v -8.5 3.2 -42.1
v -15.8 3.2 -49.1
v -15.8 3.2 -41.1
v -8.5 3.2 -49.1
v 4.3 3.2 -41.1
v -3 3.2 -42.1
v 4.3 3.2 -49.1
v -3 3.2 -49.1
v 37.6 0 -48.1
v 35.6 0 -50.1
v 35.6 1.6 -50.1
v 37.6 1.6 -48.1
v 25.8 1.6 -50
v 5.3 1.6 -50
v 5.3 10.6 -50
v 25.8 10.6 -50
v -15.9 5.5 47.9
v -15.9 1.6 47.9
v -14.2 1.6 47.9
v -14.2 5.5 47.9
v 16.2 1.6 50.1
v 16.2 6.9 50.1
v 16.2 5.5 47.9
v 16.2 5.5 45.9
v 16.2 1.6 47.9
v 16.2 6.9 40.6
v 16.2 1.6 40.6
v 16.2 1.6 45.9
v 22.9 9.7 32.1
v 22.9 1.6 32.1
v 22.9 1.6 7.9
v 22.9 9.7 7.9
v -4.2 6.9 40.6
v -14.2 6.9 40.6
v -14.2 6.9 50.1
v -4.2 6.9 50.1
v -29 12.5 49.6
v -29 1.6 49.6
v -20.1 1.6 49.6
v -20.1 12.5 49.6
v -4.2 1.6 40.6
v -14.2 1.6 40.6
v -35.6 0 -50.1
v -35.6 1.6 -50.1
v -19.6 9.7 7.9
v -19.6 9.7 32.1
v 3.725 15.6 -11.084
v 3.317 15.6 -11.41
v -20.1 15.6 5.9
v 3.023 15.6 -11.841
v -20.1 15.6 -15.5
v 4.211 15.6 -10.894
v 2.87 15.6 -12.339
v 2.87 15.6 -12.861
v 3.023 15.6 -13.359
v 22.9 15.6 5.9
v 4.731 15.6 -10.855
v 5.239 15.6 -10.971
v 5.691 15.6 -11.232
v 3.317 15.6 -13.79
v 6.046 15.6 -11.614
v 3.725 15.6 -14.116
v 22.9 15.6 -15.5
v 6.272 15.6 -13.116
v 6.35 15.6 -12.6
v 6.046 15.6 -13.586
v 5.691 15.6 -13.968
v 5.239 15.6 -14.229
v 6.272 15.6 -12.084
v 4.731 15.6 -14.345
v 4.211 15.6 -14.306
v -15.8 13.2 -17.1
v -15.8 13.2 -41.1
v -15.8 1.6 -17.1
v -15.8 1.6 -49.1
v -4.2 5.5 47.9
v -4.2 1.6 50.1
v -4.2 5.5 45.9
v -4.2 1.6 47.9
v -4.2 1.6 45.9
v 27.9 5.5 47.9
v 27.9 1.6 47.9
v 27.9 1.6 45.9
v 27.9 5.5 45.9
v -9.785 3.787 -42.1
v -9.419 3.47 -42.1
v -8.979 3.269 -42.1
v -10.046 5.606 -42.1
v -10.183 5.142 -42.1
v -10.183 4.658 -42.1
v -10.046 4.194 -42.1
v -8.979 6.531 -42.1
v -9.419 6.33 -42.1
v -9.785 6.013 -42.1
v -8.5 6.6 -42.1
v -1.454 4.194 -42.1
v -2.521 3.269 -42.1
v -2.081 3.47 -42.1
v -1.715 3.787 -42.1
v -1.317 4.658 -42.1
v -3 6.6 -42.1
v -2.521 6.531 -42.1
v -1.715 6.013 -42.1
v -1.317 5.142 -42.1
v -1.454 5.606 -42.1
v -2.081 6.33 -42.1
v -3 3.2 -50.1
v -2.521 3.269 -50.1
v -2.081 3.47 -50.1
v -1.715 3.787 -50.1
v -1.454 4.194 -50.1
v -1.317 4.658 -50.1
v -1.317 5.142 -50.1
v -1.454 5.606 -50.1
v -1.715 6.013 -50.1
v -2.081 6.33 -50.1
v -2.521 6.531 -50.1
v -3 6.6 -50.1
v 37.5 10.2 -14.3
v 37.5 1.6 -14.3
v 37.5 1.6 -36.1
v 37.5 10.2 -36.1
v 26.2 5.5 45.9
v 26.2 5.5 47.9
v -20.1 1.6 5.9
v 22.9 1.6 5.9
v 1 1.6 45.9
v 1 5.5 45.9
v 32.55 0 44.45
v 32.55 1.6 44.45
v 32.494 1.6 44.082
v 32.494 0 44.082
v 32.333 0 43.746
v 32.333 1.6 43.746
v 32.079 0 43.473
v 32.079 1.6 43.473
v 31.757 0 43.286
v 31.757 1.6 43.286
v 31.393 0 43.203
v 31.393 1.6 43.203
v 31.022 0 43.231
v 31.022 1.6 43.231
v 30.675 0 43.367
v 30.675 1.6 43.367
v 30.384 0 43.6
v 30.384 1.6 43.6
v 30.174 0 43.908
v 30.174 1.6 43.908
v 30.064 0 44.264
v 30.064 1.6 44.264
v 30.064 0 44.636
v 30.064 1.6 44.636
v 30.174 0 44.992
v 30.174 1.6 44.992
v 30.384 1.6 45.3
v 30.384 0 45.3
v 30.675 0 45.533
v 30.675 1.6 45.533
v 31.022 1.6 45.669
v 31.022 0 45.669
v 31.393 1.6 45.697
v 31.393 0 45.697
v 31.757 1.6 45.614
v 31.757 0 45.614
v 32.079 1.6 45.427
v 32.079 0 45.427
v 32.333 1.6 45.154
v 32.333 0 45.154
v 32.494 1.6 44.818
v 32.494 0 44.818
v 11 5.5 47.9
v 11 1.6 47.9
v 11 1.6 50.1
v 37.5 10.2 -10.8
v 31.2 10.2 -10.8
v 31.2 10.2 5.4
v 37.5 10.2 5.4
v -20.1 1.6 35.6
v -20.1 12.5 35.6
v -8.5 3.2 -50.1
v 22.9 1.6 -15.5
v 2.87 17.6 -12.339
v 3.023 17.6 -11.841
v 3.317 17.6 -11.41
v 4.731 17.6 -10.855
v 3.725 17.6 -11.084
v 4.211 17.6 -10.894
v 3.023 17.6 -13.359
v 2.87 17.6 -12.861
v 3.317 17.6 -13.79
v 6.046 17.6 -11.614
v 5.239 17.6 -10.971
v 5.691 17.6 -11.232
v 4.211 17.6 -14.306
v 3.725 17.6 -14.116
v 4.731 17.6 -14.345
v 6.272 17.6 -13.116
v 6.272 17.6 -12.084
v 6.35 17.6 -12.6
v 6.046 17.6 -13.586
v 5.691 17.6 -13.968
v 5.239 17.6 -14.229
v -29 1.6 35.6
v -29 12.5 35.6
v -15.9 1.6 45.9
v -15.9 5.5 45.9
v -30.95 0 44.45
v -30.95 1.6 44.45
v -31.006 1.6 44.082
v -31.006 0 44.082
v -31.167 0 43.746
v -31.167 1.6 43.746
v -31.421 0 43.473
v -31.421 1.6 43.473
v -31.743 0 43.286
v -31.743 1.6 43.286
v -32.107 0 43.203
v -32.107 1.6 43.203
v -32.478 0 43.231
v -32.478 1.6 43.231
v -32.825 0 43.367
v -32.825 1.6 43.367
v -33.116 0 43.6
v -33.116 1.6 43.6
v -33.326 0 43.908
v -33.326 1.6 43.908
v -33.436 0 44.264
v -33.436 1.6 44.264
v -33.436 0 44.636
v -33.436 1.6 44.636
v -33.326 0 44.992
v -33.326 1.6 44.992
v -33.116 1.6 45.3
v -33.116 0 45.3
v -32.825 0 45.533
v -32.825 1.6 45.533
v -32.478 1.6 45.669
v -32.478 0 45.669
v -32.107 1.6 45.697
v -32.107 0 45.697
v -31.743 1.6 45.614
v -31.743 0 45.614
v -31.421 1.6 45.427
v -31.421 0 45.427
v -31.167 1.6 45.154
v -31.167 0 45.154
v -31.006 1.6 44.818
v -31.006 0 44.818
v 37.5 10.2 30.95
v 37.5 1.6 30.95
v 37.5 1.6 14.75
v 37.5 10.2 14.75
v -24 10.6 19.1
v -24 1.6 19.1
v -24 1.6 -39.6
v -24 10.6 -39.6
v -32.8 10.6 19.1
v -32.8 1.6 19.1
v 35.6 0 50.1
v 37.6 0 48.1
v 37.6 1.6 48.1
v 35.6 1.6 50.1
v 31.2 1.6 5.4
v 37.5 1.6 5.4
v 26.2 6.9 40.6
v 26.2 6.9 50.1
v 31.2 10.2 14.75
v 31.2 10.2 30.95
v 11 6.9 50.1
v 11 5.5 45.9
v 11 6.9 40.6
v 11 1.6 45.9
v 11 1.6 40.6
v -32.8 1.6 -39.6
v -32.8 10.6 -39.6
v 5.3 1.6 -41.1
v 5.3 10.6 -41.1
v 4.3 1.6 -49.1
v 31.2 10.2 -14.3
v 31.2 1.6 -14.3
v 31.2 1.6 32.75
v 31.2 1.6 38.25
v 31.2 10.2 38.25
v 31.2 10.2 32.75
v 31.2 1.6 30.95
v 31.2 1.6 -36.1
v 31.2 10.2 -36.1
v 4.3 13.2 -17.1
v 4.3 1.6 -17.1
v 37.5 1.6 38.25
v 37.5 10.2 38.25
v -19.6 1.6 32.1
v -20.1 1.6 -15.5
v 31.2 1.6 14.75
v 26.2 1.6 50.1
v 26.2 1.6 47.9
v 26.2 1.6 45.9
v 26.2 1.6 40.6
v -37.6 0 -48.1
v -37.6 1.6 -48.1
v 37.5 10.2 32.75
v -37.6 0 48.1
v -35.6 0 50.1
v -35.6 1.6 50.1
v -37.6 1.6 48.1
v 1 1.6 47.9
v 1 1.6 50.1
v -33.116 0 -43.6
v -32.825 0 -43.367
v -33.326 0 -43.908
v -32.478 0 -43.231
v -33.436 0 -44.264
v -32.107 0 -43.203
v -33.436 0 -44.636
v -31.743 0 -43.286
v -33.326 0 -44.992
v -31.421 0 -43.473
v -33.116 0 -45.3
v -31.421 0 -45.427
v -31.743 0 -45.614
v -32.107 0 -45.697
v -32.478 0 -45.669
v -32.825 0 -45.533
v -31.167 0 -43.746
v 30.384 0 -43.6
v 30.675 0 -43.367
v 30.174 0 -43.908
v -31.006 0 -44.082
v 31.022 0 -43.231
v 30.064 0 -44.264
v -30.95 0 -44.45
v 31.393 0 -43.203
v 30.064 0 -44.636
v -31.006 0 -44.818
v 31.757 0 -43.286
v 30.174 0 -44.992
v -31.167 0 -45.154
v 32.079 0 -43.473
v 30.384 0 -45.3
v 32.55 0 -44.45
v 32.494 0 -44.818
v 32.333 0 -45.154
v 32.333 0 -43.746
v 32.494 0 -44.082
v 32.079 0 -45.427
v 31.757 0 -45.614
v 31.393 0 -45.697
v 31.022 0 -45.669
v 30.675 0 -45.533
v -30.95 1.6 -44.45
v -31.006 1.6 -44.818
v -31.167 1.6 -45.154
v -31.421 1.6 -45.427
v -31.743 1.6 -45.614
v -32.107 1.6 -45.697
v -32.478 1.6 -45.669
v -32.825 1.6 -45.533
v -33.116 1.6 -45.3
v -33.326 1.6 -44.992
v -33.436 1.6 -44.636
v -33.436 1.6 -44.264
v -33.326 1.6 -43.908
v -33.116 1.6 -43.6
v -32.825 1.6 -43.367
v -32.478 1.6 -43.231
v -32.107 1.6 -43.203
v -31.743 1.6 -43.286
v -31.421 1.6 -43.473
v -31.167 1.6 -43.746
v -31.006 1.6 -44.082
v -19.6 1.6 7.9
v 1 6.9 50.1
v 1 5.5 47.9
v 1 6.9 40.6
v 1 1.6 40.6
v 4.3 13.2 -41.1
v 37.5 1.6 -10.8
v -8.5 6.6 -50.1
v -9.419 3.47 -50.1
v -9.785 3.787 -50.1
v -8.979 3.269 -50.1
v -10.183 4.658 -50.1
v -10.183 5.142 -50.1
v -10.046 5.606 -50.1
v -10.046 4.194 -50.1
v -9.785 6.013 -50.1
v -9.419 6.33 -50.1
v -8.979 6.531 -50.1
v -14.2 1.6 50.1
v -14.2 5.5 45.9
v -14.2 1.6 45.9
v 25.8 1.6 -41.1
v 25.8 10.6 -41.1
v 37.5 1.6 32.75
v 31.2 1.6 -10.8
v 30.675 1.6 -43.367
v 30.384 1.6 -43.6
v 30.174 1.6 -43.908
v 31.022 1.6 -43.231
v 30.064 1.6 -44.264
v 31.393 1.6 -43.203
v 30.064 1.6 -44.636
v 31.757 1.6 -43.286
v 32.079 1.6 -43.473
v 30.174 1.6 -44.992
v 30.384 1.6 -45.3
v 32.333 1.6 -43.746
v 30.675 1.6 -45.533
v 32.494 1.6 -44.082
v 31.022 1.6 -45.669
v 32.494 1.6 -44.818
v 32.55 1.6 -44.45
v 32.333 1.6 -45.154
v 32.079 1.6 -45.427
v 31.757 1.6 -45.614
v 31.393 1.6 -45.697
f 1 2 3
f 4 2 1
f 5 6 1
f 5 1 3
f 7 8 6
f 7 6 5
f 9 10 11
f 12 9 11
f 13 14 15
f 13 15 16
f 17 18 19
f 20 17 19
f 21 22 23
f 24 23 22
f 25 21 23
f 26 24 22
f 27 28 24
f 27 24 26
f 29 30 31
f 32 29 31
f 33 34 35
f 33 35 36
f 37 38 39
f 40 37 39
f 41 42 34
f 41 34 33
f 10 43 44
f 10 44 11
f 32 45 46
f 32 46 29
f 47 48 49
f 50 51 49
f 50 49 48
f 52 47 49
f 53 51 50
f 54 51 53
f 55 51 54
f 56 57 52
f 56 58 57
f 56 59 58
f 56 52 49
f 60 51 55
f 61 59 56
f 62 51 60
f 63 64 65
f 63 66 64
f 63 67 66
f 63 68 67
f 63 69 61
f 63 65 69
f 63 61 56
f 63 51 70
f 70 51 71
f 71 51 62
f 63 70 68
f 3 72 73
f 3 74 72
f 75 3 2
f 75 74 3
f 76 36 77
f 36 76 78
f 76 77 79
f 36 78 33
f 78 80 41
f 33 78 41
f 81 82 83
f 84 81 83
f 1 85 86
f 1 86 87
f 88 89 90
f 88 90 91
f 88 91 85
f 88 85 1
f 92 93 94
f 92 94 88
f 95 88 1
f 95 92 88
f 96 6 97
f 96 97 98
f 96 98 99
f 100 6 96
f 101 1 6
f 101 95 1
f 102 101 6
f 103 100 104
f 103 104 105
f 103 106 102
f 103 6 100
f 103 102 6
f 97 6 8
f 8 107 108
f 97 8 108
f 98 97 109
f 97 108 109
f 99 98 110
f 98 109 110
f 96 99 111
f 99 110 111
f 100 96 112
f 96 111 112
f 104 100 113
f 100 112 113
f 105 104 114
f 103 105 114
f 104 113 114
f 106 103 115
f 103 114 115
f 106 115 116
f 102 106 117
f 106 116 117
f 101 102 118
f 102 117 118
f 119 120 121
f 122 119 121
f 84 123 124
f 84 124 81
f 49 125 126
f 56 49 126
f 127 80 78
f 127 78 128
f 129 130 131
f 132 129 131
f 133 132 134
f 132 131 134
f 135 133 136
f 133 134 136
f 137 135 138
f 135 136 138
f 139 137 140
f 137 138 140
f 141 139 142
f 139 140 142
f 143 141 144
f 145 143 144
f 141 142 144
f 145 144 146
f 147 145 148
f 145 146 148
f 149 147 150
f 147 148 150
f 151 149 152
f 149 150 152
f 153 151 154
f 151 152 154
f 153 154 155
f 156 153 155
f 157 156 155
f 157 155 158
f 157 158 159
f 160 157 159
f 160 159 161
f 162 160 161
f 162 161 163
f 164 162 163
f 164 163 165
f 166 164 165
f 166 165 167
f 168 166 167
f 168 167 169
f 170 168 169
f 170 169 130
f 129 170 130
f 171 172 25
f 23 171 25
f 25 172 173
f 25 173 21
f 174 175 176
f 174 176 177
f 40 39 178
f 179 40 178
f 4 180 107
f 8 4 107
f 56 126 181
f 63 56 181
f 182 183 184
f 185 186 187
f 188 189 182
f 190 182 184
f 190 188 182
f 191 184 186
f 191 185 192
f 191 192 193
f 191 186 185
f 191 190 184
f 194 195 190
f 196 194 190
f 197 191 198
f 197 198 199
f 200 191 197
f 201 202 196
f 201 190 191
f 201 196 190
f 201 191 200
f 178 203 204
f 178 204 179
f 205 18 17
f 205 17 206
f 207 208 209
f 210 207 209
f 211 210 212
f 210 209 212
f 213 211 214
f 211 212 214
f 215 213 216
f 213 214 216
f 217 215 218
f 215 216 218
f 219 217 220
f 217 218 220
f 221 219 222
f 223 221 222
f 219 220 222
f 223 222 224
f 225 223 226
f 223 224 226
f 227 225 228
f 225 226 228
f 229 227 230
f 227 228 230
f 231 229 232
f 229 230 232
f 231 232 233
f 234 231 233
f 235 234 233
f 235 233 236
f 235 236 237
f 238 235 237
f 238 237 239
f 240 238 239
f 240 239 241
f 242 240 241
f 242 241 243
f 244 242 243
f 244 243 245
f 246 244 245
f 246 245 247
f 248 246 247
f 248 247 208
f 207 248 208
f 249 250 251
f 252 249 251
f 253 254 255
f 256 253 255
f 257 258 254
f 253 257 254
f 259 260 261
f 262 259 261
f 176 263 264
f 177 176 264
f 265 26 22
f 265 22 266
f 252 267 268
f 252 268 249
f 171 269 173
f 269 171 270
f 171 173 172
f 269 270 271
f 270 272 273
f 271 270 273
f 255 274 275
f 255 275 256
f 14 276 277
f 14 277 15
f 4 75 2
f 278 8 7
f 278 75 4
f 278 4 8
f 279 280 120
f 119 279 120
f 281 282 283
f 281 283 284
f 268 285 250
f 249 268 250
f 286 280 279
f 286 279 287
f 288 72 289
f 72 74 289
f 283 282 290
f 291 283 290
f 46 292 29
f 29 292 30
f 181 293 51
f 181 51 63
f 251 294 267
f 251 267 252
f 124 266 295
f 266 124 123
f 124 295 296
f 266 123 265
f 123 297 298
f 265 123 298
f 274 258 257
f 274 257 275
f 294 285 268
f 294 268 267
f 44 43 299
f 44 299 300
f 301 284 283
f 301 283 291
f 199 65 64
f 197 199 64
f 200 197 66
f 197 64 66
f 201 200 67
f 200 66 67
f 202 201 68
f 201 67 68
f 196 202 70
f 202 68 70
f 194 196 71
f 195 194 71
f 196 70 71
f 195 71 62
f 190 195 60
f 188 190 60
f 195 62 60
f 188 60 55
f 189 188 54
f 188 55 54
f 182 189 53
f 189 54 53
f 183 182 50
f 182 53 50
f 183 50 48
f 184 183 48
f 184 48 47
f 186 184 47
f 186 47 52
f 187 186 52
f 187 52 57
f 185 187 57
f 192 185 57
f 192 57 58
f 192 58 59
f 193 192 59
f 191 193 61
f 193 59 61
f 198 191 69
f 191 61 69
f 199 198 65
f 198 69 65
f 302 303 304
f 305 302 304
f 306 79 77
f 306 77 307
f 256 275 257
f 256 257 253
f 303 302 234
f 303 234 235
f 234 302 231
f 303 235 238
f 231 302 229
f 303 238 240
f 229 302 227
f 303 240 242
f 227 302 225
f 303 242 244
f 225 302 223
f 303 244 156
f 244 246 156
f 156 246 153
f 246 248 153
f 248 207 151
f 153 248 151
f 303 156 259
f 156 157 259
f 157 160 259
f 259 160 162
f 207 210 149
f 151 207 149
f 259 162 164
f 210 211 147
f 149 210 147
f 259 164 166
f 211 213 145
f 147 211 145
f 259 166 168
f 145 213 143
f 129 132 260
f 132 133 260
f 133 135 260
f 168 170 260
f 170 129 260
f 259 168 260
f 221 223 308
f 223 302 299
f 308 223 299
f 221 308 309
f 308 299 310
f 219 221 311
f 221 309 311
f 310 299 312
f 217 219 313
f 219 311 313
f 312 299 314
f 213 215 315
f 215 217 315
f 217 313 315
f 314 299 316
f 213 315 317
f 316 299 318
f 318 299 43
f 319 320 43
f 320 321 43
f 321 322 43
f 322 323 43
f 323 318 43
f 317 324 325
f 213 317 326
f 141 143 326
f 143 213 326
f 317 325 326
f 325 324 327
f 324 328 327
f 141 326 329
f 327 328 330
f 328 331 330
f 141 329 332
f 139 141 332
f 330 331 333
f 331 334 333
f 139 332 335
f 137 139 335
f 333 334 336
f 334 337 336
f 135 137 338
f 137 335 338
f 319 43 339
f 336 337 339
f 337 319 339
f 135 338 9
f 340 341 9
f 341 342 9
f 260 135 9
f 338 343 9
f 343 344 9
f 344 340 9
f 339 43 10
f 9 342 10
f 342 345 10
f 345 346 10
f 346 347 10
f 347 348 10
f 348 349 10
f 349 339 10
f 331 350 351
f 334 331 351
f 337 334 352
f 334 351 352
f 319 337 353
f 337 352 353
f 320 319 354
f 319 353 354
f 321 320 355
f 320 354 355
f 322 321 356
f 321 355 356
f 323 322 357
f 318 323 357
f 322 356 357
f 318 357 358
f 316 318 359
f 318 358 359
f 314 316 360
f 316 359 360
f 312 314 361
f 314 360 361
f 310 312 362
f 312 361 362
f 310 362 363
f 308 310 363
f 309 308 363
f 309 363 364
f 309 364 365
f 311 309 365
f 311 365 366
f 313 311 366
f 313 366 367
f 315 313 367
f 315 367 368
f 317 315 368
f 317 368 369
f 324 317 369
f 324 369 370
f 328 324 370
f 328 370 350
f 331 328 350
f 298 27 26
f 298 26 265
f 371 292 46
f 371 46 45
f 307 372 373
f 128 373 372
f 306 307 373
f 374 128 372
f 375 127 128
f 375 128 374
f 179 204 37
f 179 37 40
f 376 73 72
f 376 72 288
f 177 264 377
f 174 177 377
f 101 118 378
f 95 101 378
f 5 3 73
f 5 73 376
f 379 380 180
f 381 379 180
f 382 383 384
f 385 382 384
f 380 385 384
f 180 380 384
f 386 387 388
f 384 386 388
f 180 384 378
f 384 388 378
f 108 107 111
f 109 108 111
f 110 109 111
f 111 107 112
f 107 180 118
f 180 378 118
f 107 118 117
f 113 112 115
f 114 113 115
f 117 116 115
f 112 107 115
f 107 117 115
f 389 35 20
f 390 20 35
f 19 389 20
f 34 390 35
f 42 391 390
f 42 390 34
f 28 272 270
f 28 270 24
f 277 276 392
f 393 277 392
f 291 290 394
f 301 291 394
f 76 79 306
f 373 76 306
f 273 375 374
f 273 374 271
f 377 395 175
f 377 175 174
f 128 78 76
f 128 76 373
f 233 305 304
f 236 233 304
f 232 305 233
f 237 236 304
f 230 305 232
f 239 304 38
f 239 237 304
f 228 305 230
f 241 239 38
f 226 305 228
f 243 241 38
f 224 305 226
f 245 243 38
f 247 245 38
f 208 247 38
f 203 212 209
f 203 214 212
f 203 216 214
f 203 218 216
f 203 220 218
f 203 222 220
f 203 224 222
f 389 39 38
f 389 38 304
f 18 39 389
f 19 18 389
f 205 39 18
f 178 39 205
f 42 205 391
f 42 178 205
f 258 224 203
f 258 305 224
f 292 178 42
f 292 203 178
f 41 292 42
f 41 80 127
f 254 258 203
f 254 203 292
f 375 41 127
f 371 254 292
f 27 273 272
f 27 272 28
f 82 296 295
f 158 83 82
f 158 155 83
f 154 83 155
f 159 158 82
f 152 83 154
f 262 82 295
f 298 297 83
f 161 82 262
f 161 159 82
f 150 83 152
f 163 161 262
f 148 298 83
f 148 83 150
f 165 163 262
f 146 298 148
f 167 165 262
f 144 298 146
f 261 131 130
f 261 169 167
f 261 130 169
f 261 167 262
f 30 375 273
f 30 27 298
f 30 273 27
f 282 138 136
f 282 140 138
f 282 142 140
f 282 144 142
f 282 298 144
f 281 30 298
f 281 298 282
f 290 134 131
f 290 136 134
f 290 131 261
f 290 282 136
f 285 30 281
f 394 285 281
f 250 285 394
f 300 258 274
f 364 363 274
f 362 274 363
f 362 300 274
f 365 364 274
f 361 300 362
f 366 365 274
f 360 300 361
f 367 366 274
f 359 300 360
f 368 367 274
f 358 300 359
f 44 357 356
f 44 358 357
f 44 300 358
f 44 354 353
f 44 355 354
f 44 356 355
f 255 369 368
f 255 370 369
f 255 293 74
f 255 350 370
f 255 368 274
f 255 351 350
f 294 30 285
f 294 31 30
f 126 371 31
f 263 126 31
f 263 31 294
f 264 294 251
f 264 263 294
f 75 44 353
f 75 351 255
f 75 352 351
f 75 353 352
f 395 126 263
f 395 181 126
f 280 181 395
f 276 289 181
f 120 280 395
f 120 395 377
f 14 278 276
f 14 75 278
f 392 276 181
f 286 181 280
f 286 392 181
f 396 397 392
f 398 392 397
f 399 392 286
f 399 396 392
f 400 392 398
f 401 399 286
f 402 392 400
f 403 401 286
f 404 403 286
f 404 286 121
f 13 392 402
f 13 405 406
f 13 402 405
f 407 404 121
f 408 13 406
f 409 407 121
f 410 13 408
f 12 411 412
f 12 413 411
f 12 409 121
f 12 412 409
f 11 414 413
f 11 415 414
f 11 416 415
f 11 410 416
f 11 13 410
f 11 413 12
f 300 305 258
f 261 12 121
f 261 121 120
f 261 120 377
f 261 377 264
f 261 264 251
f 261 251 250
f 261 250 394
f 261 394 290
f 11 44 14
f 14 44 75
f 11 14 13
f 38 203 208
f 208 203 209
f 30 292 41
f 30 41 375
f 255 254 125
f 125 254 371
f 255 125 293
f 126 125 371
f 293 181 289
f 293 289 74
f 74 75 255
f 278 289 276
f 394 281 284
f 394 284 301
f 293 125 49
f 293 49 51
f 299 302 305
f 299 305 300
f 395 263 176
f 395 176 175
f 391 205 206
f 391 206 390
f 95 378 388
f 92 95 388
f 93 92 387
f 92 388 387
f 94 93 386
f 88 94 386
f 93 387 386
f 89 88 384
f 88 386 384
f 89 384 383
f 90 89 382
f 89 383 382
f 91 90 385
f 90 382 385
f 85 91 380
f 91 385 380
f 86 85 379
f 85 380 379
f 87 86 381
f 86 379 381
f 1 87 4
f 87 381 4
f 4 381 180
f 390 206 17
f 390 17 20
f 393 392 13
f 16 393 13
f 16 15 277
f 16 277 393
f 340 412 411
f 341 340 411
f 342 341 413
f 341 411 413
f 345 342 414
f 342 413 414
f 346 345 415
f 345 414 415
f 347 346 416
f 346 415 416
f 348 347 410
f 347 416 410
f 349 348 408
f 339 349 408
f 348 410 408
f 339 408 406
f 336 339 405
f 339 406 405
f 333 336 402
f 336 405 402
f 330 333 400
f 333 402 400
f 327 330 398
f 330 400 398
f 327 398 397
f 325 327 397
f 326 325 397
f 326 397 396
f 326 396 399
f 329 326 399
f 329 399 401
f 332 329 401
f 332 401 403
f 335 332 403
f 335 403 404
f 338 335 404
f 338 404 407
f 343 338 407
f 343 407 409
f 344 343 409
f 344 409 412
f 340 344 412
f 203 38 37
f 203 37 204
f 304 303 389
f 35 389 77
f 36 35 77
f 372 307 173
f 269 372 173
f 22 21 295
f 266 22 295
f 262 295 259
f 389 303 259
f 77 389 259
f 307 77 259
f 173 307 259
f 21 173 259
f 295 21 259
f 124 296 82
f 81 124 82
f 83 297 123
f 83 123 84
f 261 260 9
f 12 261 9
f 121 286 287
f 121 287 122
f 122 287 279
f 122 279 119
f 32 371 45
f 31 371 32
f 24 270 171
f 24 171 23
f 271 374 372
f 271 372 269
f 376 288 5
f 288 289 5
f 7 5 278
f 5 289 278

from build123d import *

# Parameters (mm, degrees)
SKETCH1_W            = 75.2
SKETCH1_H            = 100.2
BOSS_EXTRUDE1_DEPTH  = 1.6
CHAMFER1_SIZE        = 2
SKETCH2_R            = 1.25
CUT_EXTRUDE1_DEPTH   = 2.6
SKETCH3_W            = 8.8
SKETCH3_H            = 58.7
SKETCH3_W_2          = 20.5
SKETCH3_H_2          = 8.9
BOSS_EXTRUDE2_DEPTH  = 9
SKETCH3_3_W          = 20.1
SKETCH3_3_H          = 32
BOSS_EXTRUDE3_DEPTH  = 1.6
SKETCH3_4_W          = 6.3
SKETCH3_4_H          = 21.8
SKETCH3_4_H_2        = 16.2
SKETCH3_4_H_3        = 5.5
BOSS_EXTRUDE4_DEPTH  = 8.6
SKETCH3_5_W          = 10
SKETCH3_5_H          = 9.5
BOSS_EXTRUDE5_DEPTH  = 5.3
SKETCH3_6_W          = 8.9
SKETCH3_6_H          = 14
BOSS_EXTRUDE6_DEPTH  = 10.9
BOSS_EXTRUDE7_DEPTH  = 8
SKETCH5_W            = 43.8
SKETCH5_H            = 2
BOSS_EXTRUDE8_DEPTH  = 3.9
SKETCH7_W            = 42.5
SKETCH7_H            = 24.2
BOSS_EXTRUDE9_DEPTH  = 8.1
SKETCH7_3_W          = 43
SKETCH7_3_H          = 21.4
BOSS_EXTRUDE10_DEPTH = 14
SKETCH8_W            = 20.1
SKETCH8_H            = 24
BOSS_EXTRUDE11_DEPTH = 10
SKETCH9_R            = 1.75
BOSS_EXTRUDE12_DEPTH = 2


with BuildPart() as part:
    # Sketch1 → Boss-Extrude1 (new body)
    with BuildSketch(Plane(origin=(0, 0, 0), x_dir=(1, 0, 0), z_dir=(0, 1, 0))):
        Rectangle(SKETCH1_W, SKETCH1_H)
    extrude(amount=BOSS_EXTRUDE1_DEPTH)

    # Chamfer1
    chamfer1_edges = [part.edges().sort_by_distance(p)[0] for p in [
        (37.6, 0.8, 50.1),
        (-37.6, 0.8, 50.1),
        (-37.6, 0.8, -50.1),
        (37.6, 0.8, -50.1),
    ]]
    chamfer(chamfer1_edges, length=CHAMFER1_SIZE)

    # Sketch2 → Cut-Extrude1 (cut, through all)
    with BuildSketch(Plane(origin=(0, 1.6, 0), x_dir=(1, 0, 0), z_dir=(0, 1, 0))):
        with Locations((-32.2, 44.45)):
            Circle(SKETCH2_R)
        with Locations((-32.2, -44.45)):
            Circle(SKETCH2_R)
        with Locations((31.3, -44.45)):
            Circle(SKETCH2_R)
        with Locations((31.3, 44.45)):
            Circle(SKETCH2_R)
    extrude(amount=-CUT_EXTRUDE1_DEPTH, mode=Mode.SUBTRACT)

    # Sketch3 → Boss-Extrude2 (add)
    with BuildSketch(Plane(origin=(0, 1.6, 0), x_dir=(1, 0, 0), z_dir=(0, 1, 0))):
        with Locations((-28.4, 10.25)):
            Rectangle(SKETCH3_W, SKETCH3_H)
        with Locations((15.55, 45.55)):
            Rectangle(SKETCH3_W_2, SKETCH3_H_2)
    extrude(amount=BOSS_EXTRUDE2_DEPTH)

    # Sketch3<3> → Boss-Extrude3 (add)
    with BuildSketch(Plane(origin=(0, 1.6, 0), x_dir=(1, 0, 0), z_dir=(0, 1, 0))):
        with Locations((-5.75, 33.1)):
            Rectangle(SKETCH3_3_W, SKETCH3_3_H)
    extrude(amount=BOSS_EXTRUDE3_DEPTH)

    # Sketch3<4> → Boss-Extrude4 (add)
    with BuildSketch(Plane(origin=(0, 1.6, 0), x_dir=(1, 0, 0), z_dir=(0, 1, 0))):
        with Locations((34.35, 25.2)):
            Rectangle(SKETCH3_4_W, SKETCH3_4_H)
        with Locations((34.35, 2.7)):
            Rectangle(SKETCH3_4_W, SKETCH3_4_H_2)
        with Locations((34.35, -22.85)):
            Rectangle(SKETCH3_4_W, SKETCH3_4_H_2)
        with Locations((34.35, -35.5)):
            Rectangle(SKETCH3_4_W, SKETCH3_4_H_3)
    extrude(amount=BOSS_EXTRUDE4_DEPTH)

    # Sketch3<5> → Boss-Extrude5 (add)
    with BuildSketch(Plane(origin=(0, 1.6, 0), x_dir=(1, 0, 0), z_dir=(0, 1, 0))):
        with Locations((-9.2, -45.35)):
            Rectangle(SKETCH3_5_W, SKETCH3_5_H)
        with Locations((6, -45.35)):
            Rectangle(SKETCH3_5_W, SKETCH3_5_H)
        with Locations((21.2, -45.35)):
            Rectangle(SKETCH3_5_W, SKETCH3_5_H)
    extrude(amount=BOSS_EXTRUDE5_DEPTH)

    # Sketch3<6> → Boss-Extrude6 (add)
    with BuildSketch(Plane(origin=(0, 1.6, 0), x_dir=(1, 0, 0), z_dir=(0, 1, 0))):
        with Locations((-24.55, -42.6)):
            Rectangle(SKETCH3_6_W, SKETCH3_6_H)
    extrude(amount=BOSS_EXTRUDE6_DEPTH)

    # Sketch4 → Boss-Extrude7 (add)
    with BuildSketch(Plane(origin=(0, 0, -50.1), x_dir=(-1, 0, 0), z_dir=(0, 0, -1))):
        with BuildLine():
            Line((8.5, 3.2), (3, 3.2))
            ThreePointArc((3, 3.2), (1.3, 4.9), (3, 6.6))
            Line((3, 6.6), (8.5, 6.6))
            ThreePointArc((8.5, 6.6), (10.2, 4.9), (8.5, 3.2))
        make_face()
    extrude(amount=-BOSS_EXTRUDE7_DEPTH)

    # Sketch5 → Boss-Extrude8 (add)
    with BuildSketch(Plane(origin=(0, 1.6, 0), x_dir=(1, 0, 0), z_dir=(0, 1, 0))):
        with Locations((6, -46.9)):
            Rectangle(SKETCH5_W, SKETCH5_H)
    extrude(amount=BOSS_EXTRUDE8_DEPTH)

    # Sketch7 → Boss-Extrude9 (add)
    with BuildSketch(Plane(origin=(0, 1.6, 0), x_dir=(1, 0, 0), z_dir=(0, 1, 0))):
        with Locations((1.65, -20)):
            Rectangle(SKETCH7_W, SKETCH7_H)
    extrude(amount=BOSS_EXTRUDE9_DEPTH)

    # Sketch7<3> → Boss-Extrude10 (add)
    with BuildSketch(Plane(origin=(0, 1.6, 0), x_dir=(1, 0, 0), z_dir=(0, 1, 0))):
        with Locations((1.4, 4.8)):
            Rectangle(SKETCH7_3_W, SKETCH7_3_H)
    extrude(amount=BOSS_EXTRUDE10_DEPTH)

    # Sketch8 → Boss-Extrude11 (add)
    with BuildSketch(Plane(origin=(0, 3.2, 0), x_dir=(1, 0, 0), z_dir=(0, 1, 0))):
        with Locations((-5.75, 29.1)):
            Rectangle(SKETCH8_W, SKETCH8_H)
    extrude(amount=BOSS_EXTRUDE11_DEPTH)

    # Sketch9 → Boss-Extrude12 (add)
    with BuildSketch(Plane(origin=(0, 15.6, 0), x_dir=(1, 0, 0), z_dir=(0, 1, 0))):
        with Locations((4.6, 12.6)):
            Circle(SKETCH9_R)
    extrude(amount=BOSS_EXTRUDE12_DEPTH)


solid = part.part
